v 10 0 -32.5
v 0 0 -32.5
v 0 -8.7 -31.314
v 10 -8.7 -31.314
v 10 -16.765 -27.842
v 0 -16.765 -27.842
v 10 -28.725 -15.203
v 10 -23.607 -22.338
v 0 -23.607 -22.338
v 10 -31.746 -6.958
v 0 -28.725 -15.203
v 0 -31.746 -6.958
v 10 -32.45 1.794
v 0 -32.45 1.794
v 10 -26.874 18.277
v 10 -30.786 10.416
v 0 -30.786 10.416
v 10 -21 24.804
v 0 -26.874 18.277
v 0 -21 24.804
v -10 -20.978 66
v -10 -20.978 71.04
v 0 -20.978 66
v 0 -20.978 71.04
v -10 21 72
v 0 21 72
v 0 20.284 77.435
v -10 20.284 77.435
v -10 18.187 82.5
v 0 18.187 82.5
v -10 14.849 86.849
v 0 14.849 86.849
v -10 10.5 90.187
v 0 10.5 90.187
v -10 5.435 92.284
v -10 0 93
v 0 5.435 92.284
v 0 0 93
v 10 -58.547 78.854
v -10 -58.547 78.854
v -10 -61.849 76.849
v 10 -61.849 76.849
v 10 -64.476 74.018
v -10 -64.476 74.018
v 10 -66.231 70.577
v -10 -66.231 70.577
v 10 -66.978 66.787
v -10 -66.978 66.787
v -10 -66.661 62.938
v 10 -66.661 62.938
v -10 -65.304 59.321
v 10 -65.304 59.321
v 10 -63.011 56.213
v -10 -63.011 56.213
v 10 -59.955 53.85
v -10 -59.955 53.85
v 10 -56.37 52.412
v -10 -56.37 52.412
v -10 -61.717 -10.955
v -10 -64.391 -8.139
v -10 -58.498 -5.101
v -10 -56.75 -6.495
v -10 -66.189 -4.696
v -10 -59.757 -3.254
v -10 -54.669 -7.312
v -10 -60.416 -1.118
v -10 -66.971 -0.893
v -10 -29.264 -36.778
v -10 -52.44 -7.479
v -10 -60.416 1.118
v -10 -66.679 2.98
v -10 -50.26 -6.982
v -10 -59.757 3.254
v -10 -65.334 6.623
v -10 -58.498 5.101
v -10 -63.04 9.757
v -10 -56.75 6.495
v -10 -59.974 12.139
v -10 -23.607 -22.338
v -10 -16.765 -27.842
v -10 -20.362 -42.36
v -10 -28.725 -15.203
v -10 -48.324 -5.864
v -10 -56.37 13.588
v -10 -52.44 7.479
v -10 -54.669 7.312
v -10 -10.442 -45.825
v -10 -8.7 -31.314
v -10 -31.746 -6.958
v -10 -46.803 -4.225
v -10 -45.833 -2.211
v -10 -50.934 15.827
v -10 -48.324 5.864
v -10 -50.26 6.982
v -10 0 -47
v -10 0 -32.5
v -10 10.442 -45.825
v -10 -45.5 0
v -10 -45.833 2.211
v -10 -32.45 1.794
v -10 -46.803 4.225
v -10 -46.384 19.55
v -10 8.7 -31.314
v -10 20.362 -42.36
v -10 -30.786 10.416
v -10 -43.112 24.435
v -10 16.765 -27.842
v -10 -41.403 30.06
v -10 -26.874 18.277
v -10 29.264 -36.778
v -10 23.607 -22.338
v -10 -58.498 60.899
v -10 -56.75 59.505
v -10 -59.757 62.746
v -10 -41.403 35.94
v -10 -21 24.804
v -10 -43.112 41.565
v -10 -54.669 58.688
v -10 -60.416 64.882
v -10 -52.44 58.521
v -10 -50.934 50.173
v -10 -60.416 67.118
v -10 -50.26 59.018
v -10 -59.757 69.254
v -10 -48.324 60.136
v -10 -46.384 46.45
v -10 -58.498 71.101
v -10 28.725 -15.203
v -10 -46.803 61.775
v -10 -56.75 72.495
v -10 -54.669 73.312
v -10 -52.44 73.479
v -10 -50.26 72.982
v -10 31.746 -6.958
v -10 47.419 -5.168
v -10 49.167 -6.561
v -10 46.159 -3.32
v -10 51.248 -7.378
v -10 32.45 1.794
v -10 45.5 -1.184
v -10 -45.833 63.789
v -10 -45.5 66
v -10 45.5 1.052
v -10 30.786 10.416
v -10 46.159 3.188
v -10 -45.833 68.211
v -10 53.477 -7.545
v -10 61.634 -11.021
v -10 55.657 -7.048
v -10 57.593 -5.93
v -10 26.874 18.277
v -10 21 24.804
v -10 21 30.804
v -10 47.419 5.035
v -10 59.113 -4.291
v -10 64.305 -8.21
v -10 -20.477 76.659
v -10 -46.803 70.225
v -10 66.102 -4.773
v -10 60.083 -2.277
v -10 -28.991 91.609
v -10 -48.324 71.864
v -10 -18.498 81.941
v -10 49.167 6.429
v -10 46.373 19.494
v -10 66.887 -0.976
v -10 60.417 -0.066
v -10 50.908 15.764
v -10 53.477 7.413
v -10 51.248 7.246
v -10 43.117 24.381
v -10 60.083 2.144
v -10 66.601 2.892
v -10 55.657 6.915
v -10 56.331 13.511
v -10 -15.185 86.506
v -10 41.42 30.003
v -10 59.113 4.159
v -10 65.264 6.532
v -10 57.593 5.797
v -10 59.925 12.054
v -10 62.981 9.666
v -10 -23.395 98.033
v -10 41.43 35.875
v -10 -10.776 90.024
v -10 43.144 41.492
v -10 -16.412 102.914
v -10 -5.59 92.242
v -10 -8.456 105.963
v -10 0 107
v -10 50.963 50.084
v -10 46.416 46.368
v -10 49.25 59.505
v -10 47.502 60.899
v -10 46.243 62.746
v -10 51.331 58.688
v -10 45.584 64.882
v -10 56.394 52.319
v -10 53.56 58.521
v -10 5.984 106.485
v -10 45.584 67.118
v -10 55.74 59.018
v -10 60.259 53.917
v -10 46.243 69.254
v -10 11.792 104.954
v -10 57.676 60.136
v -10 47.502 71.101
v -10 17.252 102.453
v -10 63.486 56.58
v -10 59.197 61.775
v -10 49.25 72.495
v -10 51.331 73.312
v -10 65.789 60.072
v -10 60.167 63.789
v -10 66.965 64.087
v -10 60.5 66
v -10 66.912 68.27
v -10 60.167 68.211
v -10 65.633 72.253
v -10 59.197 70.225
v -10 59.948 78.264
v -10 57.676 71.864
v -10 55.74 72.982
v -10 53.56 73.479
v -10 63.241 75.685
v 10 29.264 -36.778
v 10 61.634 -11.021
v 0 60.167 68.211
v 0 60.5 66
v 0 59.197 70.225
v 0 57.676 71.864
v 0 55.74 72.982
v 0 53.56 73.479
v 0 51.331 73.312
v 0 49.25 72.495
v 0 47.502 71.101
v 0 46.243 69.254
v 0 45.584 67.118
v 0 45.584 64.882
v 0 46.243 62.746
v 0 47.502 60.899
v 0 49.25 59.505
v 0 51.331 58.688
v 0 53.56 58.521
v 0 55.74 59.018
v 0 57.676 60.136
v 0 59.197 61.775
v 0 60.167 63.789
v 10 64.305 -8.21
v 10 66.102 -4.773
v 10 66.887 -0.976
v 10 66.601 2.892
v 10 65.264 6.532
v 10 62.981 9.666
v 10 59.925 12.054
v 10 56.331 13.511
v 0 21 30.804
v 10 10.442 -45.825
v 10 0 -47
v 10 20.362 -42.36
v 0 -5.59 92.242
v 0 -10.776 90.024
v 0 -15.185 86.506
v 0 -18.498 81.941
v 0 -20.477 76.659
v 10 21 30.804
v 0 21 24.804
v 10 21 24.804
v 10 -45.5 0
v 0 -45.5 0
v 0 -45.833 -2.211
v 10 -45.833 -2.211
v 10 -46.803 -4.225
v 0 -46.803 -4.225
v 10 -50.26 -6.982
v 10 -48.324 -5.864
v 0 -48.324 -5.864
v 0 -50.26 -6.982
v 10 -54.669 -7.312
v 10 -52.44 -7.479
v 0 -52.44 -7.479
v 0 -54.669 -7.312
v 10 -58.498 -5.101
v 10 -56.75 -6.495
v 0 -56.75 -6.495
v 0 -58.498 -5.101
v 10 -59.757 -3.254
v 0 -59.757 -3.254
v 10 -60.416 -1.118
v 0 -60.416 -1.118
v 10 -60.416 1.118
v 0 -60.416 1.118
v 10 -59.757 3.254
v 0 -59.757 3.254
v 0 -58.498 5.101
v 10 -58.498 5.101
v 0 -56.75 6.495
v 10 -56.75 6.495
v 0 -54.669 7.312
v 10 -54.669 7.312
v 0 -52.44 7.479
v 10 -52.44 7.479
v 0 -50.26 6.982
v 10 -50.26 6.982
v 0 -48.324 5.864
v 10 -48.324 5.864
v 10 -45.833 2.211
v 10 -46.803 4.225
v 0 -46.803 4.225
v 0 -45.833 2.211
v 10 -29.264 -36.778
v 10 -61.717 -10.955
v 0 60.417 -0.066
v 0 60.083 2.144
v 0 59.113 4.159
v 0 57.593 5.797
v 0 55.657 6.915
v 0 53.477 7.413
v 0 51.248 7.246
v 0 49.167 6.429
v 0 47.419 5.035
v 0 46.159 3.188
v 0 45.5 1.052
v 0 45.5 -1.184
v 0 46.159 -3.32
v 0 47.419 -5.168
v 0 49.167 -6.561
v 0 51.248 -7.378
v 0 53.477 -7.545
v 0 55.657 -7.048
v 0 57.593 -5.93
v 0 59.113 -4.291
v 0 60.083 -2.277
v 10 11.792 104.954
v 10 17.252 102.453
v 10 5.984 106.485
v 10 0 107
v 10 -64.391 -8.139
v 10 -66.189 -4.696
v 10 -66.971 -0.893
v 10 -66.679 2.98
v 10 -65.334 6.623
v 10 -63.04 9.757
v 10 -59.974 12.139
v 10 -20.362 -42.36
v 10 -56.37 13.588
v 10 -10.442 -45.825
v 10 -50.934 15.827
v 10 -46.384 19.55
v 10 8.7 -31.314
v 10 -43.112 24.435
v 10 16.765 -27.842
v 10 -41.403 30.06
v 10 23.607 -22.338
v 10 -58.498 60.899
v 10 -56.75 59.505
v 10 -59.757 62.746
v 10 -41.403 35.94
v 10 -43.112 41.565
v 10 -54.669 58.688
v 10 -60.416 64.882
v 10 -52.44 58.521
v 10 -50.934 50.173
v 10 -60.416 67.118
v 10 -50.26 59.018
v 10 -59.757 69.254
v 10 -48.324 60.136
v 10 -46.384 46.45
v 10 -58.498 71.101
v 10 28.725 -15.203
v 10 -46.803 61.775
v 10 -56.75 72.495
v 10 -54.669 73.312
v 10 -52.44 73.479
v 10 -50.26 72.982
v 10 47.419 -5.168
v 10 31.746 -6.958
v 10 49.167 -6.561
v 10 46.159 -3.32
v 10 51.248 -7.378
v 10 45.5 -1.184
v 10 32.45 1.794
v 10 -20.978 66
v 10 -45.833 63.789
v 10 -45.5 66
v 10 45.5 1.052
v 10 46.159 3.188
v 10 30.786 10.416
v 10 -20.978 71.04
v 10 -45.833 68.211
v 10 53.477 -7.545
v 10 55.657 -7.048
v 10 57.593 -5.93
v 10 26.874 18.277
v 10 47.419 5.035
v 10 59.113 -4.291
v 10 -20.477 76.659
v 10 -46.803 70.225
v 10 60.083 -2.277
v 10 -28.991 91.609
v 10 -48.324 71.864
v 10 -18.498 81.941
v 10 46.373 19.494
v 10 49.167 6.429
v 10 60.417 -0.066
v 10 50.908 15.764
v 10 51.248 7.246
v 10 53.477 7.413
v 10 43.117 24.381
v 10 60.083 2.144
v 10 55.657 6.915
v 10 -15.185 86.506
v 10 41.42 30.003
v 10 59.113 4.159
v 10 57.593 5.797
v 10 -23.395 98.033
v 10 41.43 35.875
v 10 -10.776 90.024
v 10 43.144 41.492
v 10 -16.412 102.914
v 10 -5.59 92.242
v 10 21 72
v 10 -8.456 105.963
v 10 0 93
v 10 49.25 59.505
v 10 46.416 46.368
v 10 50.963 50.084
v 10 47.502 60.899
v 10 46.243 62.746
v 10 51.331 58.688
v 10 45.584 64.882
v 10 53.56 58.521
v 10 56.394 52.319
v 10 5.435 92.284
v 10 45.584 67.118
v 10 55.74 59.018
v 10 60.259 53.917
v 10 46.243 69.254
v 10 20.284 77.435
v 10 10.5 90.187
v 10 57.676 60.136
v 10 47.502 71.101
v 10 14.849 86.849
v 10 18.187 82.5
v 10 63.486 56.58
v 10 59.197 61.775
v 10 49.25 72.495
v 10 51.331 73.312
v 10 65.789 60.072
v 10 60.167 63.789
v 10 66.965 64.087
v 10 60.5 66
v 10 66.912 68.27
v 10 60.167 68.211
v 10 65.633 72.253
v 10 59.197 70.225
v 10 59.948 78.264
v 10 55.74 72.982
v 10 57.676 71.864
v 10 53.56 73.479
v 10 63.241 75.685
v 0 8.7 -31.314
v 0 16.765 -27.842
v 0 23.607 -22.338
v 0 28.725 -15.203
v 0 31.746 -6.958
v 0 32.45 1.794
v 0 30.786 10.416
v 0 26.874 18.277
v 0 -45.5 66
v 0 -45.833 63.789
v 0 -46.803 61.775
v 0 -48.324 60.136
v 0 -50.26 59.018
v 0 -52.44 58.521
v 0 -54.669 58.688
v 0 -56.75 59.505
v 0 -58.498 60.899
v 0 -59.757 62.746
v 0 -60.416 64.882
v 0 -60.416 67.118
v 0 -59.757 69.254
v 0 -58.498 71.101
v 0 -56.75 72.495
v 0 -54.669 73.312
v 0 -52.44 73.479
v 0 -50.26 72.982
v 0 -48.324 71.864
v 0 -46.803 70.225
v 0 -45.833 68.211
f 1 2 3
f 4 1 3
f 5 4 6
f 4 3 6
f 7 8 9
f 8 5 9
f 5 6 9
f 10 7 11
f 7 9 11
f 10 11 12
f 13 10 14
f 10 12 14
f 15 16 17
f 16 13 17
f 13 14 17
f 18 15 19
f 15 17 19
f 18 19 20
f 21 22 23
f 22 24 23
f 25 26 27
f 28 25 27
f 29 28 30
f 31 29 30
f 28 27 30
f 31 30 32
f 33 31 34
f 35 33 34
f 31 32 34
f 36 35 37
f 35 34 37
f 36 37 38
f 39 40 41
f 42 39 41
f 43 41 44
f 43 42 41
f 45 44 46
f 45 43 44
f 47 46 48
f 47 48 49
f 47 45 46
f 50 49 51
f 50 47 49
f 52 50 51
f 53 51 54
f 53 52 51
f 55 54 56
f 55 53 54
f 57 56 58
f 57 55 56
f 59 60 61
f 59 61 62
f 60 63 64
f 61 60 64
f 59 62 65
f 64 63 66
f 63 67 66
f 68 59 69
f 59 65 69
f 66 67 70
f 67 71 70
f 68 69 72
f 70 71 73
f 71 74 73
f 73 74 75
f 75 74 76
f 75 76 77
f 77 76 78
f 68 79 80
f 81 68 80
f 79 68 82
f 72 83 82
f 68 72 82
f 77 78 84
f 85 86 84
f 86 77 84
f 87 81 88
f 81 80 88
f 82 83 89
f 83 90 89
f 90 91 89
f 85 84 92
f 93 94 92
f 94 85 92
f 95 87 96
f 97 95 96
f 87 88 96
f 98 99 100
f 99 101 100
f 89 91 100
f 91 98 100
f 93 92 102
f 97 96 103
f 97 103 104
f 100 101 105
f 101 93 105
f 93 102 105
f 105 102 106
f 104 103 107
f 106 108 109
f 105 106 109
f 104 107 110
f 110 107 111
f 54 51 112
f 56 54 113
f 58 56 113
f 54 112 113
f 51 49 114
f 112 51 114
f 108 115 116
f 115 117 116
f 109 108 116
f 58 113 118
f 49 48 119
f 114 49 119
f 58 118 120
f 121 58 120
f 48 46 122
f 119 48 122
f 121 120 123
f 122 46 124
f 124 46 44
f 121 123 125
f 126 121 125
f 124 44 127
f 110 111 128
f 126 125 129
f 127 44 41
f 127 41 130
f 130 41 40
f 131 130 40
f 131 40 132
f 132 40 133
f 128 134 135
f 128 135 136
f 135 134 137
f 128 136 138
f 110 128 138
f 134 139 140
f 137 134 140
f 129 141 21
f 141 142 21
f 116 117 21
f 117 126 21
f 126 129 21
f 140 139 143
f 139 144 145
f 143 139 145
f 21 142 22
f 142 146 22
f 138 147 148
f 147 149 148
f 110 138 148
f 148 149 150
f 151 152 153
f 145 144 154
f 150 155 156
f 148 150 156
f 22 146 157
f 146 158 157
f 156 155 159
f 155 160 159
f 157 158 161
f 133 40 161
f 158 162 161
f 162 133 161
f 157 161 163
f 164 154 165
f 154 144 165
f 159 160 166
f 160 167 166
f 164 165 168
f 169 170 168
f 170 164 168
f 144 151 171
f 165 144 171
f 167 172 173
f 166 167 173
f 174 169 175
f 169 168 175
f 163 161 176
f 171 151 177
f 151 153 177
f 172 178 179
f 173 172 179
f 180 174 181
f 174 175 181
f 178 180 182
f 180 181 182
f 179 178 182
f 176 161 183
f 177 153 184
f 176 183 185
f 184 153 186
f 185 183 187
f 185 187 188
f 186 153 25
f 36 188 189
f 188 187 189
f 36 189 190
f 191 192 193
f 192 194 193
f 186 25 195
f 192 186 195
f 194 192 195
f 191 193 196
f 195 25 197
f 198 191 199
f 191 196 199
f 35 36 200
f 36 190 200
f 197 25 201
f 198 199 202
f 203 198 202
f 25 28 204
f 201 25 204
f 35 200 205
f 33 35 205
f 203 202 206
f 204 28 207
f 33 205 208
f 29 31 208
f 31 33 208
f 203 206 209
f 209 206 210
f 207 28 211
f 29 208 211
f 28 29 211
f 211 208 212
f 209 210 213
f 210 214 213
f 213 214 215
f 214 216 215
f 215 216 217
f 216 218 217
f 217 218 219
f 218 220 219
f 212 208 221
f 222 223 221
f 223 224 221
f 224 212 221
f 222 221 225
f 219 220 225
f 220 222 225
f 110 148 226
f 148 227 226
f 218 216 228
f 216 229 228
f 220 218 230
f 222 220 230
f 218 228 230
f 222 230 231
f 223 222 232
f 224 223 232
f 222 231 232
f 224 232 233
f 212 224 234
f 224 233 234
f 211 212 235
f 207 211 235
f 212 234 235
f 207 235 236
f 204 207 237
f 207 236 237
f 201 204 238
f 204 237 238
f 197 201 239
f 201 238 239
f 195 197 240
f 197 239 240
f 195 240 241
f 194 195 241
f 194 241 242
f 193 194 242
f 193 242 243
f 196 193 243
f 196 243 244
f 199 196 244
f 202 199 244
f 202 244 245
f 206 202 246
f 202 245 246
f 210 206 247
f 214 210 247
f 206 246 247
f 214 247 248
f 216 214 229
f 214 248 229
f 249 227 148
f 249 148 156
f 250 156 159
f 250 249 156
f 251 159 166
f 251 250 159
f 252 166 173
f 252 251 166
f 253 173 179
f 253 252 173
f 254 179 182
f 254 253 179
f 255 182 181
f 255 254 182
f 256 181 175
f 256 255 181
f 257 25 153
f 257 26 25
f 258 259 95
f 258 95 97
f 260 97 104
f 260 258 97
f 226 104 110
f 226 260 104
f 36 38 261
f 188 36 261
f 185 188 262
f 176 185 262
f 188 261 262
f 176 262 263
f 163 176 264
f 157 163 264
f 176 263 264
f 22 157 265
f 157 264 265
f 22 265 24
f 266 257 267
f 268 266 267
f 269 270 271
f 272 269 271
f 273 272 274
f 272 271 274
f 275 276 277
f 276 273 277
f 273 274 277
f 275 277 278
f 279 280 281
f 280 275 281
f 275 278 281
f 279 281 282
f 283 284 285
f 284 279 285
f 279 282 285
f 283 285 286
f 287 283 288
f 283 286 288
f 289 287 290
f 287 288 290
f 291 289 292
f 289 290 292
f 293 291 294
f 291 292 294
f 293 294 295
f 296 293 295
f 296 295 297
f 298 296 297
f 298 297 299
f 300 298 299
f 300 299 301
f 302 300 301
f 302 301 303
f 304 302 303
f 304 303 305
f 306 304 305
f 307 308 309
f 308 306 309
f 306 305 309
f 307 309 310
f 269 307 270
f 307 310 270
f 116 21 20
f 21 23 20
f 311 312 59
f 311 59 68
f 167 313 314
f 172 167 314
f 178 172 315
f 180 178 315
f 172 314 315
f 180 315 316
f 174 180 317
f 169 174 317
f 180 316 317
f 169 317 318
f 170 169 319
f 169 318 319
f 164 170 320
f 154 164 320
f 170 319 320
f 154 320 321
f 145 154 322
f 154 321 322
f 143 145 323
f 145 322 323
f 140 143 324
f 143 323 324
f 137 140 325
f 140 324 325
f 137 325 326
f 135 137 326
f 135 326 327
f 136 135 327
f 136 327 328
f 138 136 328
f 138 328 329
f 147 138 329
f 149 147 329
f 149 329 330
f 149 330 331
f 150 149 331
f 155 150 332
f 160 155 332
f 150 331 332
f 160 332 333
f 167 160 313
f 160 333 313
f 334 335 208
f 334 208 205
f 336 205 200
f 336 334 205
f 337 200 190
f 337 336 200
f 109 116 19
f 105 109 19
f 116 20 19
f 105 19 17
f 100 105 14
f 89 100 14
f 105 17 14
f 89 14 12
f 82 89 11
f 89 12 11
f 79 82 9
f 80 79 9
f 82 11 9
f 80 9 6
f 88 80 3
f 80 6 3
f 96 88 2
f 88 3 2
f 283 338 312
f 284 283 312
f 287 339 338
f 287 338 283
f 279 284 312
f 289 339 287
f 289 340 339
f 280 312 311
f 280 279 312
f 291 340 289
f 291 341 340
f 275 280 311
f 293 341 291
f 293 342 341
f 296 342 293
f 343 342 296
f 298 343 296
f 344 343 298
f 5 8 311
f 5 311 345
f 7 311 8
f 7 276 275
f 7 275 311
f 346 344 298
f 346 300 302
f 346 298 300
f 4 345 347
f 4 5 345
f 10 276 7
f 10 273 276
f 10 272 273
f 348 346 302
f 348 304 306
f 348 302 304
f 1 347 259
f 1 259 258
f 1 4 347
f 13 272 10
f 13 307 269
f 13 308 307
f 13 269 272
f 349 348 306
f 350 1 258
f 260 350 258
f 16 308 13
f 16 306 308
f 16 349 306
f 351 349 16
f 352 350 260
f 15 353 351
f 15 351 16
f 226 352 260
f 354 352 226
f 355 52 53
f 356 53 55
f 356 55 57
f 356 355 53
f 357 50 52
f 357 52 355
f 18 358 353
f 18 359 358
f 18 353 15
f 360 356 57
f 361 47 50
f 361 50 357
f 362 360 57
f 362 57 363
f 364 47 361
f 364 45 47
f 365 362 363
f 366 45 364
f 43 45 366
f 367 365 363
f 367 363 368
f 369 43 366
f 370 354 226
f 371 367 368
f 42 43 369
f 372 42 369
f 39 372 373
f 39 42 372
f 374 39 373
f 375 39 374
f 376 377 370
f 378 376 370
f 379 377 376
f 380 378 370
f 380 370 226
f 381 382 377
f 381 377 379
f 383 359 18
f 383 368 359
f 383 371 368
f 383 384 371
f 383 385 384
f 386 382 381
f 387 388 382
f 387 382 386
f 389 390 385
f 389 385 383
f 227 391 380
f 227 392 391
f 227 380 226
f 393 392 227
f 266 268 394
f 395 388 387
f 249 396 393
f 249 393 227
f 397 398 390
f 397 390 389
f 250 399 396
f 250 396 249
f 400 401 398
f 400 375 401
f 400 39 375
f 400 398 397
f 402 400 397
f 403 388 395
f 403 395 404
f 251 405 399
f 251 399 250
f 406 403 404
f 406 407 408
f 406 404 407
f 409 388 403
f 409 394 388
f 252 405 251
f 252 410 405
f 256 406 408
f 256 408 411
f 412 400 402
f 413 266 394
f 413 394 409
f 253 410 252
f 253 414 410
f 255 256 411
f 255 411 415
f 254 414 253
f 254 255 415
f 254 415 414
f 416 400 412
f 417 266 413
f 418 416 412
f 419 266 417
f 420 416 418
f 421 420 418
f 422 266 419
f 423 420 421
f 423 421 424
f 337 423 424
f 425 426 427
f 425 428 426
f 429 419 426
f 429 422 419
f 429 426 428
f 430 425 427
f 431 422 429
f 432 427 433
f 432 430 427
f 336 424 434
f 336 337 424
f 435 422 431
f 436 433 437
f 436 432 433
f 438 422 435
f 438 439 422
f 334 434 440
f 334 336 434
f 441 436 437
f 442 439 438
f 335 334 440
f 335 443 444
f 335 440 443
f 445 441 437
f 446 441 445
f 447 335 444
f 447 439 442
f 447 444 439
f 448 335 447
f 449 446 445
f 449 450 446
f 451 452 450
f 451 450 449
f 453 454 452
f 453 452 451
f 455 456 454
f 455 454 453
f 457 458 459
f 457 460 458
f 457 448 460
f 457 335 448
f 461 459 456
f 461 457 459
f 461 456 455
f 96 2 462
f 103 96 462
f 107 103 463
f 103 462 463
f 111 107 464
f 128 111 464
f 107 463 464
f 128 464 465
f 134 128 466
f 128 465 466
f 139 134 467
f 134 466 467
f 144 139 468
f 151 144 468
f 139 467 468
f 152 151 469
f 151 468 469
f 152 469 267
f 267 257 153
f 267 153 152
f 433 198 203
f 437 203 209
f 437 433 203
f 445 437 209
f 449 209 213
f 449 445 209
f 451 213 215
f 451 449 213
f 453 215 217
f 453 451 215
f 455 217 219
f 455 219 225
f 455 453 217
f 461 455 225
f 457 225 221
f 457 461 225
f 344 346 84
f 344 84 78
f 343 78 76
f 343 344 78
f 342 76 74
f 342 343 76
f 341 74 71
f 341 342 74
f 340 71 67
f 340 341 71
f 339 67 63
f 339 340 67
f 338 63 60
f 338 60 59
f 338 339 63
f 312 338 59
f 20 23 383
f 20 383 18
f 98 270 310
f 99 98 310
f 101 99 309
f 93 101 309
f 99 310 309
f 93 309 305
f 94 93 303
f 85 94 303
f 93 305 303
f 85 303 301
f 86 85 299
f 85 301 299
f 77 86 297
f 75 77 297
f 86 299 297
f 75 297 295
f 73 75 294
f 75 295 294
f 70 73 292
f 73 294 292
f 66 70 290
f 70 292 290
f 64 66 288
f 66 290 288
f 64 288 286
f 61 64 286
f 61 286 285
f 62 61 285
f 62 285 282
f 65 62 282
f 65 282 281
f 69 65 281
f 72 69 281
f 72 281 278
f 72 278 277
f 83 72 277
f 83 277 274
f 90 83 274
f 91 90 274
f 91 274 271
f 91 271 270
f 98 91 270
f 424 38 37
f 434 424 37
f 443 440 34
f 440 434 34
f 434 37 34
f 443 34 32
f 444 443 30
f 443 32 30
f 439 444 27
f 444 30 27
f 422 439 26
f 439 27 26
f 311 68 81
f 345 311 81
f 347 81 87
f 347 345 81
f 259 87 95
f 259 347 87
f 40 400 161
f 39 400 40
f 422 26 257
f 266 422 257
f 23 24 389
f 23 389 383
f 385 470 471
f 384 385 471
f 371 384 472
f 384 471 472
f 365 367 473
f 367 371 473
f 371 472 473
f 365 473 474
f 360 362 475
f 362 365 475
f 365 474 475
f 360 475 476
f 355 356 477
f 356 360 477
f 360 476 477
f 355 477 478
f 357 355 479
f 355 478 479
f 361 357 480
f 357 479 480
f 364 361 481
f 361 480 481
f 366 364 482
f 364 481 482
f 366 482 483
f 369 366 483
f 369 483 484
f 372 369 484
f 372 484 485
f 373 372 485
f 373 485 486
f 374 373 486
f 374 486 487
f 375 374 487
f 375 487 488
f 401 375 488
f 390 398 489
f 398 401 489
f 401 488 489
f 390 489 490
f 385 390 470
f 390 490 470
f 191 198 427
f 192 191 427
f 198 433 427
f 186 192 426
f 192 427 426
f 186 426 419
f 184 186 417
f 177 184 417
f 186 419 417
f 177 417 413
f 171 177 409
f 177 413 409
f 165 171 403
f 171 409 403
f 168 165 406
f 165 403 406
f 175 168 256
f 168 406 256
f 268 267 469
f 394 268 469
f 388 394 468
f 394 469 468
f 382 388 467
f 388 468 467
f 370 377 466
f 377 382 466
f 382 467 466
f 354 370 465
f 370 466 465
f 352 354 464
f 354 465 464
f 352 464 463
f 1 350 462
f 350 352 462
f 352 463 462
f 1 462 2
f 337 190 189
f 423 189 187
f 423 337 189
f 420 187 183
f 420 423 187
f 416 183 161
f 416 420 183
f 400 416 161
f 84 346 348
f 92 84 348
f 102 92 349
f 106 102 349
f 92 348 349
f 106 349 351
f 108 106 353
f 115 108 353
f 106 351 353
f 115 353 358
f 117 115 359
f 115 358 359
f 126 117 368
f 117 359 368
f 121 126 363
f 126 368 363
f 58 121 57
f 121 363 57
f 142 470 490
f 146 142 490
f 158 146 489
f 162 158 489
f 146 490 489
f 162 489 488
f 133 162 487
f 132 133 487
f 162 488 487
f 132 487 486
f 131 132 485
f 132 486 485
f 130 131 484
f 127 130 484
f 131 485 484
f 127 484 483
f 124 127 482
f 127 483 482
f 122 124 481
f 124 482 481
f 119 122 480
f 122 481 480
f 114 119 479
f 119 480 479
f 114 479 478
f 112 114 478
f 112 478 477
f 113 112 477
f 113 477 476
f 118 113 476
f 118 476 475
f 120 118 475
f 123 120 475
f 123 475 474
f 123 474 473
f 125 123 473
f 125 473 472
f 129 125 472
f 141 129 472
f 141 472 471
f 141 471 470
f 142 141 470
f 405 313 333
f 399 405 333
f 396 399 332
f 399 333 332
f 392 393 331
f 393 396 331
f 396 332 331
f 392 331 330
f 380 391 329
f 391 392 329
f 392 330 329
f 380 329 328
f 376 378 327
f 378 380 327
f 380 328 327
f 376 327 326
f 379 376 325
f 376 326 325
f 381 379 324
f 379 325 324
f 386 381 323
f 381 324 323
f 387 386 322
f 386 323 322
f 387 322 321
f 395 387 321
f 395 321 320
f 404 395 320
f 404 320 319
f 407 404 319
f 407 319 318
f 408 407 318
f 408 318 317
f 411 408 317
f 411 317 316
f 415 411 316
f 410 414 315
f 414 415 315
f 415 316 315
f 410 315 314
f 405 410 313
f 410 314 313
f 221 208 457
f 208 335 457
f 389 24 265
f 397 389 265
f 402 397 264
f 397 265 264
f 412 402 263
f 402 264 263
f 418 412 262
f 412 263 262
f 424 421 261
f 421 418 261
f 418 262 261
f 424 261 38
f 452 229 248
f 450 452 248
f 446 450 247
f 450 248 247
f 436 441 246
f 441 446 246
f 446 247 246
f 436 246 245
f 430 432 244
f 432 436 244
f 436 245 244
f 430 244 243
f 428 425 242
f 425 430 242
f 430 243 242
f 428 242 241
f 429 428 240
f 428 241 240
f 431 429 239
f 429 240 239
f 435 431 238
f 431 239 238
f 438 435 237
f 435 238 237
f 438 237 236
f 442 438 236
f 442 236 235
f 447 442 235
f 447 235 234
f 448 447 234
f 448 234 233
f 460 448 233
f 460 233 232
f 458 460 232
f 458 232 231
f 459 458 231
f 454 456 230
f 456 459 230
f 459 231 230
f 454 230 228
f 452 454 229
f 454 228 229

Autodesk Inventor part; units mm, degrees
ref_plane "YZ Plane" through (0, 0, 0) normal (1, 0, 0) x (0, 1, 0)
ref_plane "XZ Plane" through (0, 0, 0) normal (0, 1, 0) x (-1, 0, 0)
ref_plane "XY Plane" through (0, 0, 0) normal (0, 0, 1) x (1, 0, 0)
sketch "Sketch1" plane through (0, 0, 0) normal (1, 0, 0) x (0, 1, 0)
  arc A0 (17.2522, 102.4526) -> (0, 107) centre (0, 72) ccw
  arc A1 (0, -47) -> (29.2642, -36.7778) centre (0, 0) ccw
  arc A2 (56.3935, 52.3189) -> (59.948, 78.2643) centre (53, 66) ccw
  arc A3 (61.6337, -11.0214) -> (56.3309, 13.511) centre (52.9167, -0.0663) ccw
  line L0 (17.2522, 102.4526) -> (59.948, 78.2643)
  line L1 (61.6337, -11.0214) -> (29.2642, -36.7778)
  arc A4 (56.3935, 52.3189) -> (56.3309, 13.511) centre (61.2084, 32.9071) ccw
  arc A5 (21, 72) -> (0, 93) centre (0, 72) ccw
  arc A6 (0, -32.5) -> (21, 24.8042) centre (0, 0) ccw
  line L2 (21, 72) -> (21, 30.8042)
  circle A7 centre (53, 66) radius 7.5
  circle A8 centre (52.9167, -0.0663) radius 7.5
  arc A9 (-56.3704, 13.5882) -> (-56.3704, 52.4118) centre (-61.1854, 33) ccw
  line L3 (-20.9781, 66) -> (-21, 24.8042)
  circle A10 centre (-53, 66) radius 7.5
  line L4 (-28.9912, 91.6089) -> (-58.5472, 78.8541)
  arc A11 (0, 107) -> (-28.9912, 91.6089) centre (0, 72) ccw
  arc A12 (-58.5472, 78.8541) -> (-56.3704, 52.4118) centre (-53, 66) ccw
  arc A13 (-56.3704, 13.5882) -> (-61.717, -10.9551) centre (-53, 0) ccw
  arc A14 (-21, 24.8042) -> (0, -32.5) centre (0, 0) ccw
  arc A15 (-29.2642, -36.7778) -> (0, -47) centre (0, 0) ccw
  line L5 (-61.717, -10.9551) -> (-29.2642, -36.7778)
  circle A16 centre (-53, 0) radius 7.5
  arc A17 (0, 93) -> (-20.9781, 71.0401) centre (0, 72) ccw
  line L6 (21, 30.8042) -> (21, 24.8042)
  line L7 (-20.9781, 71.0401) -> (-20.9781, 66)
  dimension "d15" = 15
  dimension "d16" = 20
  dimension "d17" = 32.5
  dimension "d18" = 47
  dimension "d19" = 21
  dimension "d20" = 72
  dimension "d21" = 106
  dimension "d22" = 66
  dimension "d23" = 15
extrude "Extrusion1" add sketch "Sketch1" against normal mid plane 20
properties part number "hw9"
